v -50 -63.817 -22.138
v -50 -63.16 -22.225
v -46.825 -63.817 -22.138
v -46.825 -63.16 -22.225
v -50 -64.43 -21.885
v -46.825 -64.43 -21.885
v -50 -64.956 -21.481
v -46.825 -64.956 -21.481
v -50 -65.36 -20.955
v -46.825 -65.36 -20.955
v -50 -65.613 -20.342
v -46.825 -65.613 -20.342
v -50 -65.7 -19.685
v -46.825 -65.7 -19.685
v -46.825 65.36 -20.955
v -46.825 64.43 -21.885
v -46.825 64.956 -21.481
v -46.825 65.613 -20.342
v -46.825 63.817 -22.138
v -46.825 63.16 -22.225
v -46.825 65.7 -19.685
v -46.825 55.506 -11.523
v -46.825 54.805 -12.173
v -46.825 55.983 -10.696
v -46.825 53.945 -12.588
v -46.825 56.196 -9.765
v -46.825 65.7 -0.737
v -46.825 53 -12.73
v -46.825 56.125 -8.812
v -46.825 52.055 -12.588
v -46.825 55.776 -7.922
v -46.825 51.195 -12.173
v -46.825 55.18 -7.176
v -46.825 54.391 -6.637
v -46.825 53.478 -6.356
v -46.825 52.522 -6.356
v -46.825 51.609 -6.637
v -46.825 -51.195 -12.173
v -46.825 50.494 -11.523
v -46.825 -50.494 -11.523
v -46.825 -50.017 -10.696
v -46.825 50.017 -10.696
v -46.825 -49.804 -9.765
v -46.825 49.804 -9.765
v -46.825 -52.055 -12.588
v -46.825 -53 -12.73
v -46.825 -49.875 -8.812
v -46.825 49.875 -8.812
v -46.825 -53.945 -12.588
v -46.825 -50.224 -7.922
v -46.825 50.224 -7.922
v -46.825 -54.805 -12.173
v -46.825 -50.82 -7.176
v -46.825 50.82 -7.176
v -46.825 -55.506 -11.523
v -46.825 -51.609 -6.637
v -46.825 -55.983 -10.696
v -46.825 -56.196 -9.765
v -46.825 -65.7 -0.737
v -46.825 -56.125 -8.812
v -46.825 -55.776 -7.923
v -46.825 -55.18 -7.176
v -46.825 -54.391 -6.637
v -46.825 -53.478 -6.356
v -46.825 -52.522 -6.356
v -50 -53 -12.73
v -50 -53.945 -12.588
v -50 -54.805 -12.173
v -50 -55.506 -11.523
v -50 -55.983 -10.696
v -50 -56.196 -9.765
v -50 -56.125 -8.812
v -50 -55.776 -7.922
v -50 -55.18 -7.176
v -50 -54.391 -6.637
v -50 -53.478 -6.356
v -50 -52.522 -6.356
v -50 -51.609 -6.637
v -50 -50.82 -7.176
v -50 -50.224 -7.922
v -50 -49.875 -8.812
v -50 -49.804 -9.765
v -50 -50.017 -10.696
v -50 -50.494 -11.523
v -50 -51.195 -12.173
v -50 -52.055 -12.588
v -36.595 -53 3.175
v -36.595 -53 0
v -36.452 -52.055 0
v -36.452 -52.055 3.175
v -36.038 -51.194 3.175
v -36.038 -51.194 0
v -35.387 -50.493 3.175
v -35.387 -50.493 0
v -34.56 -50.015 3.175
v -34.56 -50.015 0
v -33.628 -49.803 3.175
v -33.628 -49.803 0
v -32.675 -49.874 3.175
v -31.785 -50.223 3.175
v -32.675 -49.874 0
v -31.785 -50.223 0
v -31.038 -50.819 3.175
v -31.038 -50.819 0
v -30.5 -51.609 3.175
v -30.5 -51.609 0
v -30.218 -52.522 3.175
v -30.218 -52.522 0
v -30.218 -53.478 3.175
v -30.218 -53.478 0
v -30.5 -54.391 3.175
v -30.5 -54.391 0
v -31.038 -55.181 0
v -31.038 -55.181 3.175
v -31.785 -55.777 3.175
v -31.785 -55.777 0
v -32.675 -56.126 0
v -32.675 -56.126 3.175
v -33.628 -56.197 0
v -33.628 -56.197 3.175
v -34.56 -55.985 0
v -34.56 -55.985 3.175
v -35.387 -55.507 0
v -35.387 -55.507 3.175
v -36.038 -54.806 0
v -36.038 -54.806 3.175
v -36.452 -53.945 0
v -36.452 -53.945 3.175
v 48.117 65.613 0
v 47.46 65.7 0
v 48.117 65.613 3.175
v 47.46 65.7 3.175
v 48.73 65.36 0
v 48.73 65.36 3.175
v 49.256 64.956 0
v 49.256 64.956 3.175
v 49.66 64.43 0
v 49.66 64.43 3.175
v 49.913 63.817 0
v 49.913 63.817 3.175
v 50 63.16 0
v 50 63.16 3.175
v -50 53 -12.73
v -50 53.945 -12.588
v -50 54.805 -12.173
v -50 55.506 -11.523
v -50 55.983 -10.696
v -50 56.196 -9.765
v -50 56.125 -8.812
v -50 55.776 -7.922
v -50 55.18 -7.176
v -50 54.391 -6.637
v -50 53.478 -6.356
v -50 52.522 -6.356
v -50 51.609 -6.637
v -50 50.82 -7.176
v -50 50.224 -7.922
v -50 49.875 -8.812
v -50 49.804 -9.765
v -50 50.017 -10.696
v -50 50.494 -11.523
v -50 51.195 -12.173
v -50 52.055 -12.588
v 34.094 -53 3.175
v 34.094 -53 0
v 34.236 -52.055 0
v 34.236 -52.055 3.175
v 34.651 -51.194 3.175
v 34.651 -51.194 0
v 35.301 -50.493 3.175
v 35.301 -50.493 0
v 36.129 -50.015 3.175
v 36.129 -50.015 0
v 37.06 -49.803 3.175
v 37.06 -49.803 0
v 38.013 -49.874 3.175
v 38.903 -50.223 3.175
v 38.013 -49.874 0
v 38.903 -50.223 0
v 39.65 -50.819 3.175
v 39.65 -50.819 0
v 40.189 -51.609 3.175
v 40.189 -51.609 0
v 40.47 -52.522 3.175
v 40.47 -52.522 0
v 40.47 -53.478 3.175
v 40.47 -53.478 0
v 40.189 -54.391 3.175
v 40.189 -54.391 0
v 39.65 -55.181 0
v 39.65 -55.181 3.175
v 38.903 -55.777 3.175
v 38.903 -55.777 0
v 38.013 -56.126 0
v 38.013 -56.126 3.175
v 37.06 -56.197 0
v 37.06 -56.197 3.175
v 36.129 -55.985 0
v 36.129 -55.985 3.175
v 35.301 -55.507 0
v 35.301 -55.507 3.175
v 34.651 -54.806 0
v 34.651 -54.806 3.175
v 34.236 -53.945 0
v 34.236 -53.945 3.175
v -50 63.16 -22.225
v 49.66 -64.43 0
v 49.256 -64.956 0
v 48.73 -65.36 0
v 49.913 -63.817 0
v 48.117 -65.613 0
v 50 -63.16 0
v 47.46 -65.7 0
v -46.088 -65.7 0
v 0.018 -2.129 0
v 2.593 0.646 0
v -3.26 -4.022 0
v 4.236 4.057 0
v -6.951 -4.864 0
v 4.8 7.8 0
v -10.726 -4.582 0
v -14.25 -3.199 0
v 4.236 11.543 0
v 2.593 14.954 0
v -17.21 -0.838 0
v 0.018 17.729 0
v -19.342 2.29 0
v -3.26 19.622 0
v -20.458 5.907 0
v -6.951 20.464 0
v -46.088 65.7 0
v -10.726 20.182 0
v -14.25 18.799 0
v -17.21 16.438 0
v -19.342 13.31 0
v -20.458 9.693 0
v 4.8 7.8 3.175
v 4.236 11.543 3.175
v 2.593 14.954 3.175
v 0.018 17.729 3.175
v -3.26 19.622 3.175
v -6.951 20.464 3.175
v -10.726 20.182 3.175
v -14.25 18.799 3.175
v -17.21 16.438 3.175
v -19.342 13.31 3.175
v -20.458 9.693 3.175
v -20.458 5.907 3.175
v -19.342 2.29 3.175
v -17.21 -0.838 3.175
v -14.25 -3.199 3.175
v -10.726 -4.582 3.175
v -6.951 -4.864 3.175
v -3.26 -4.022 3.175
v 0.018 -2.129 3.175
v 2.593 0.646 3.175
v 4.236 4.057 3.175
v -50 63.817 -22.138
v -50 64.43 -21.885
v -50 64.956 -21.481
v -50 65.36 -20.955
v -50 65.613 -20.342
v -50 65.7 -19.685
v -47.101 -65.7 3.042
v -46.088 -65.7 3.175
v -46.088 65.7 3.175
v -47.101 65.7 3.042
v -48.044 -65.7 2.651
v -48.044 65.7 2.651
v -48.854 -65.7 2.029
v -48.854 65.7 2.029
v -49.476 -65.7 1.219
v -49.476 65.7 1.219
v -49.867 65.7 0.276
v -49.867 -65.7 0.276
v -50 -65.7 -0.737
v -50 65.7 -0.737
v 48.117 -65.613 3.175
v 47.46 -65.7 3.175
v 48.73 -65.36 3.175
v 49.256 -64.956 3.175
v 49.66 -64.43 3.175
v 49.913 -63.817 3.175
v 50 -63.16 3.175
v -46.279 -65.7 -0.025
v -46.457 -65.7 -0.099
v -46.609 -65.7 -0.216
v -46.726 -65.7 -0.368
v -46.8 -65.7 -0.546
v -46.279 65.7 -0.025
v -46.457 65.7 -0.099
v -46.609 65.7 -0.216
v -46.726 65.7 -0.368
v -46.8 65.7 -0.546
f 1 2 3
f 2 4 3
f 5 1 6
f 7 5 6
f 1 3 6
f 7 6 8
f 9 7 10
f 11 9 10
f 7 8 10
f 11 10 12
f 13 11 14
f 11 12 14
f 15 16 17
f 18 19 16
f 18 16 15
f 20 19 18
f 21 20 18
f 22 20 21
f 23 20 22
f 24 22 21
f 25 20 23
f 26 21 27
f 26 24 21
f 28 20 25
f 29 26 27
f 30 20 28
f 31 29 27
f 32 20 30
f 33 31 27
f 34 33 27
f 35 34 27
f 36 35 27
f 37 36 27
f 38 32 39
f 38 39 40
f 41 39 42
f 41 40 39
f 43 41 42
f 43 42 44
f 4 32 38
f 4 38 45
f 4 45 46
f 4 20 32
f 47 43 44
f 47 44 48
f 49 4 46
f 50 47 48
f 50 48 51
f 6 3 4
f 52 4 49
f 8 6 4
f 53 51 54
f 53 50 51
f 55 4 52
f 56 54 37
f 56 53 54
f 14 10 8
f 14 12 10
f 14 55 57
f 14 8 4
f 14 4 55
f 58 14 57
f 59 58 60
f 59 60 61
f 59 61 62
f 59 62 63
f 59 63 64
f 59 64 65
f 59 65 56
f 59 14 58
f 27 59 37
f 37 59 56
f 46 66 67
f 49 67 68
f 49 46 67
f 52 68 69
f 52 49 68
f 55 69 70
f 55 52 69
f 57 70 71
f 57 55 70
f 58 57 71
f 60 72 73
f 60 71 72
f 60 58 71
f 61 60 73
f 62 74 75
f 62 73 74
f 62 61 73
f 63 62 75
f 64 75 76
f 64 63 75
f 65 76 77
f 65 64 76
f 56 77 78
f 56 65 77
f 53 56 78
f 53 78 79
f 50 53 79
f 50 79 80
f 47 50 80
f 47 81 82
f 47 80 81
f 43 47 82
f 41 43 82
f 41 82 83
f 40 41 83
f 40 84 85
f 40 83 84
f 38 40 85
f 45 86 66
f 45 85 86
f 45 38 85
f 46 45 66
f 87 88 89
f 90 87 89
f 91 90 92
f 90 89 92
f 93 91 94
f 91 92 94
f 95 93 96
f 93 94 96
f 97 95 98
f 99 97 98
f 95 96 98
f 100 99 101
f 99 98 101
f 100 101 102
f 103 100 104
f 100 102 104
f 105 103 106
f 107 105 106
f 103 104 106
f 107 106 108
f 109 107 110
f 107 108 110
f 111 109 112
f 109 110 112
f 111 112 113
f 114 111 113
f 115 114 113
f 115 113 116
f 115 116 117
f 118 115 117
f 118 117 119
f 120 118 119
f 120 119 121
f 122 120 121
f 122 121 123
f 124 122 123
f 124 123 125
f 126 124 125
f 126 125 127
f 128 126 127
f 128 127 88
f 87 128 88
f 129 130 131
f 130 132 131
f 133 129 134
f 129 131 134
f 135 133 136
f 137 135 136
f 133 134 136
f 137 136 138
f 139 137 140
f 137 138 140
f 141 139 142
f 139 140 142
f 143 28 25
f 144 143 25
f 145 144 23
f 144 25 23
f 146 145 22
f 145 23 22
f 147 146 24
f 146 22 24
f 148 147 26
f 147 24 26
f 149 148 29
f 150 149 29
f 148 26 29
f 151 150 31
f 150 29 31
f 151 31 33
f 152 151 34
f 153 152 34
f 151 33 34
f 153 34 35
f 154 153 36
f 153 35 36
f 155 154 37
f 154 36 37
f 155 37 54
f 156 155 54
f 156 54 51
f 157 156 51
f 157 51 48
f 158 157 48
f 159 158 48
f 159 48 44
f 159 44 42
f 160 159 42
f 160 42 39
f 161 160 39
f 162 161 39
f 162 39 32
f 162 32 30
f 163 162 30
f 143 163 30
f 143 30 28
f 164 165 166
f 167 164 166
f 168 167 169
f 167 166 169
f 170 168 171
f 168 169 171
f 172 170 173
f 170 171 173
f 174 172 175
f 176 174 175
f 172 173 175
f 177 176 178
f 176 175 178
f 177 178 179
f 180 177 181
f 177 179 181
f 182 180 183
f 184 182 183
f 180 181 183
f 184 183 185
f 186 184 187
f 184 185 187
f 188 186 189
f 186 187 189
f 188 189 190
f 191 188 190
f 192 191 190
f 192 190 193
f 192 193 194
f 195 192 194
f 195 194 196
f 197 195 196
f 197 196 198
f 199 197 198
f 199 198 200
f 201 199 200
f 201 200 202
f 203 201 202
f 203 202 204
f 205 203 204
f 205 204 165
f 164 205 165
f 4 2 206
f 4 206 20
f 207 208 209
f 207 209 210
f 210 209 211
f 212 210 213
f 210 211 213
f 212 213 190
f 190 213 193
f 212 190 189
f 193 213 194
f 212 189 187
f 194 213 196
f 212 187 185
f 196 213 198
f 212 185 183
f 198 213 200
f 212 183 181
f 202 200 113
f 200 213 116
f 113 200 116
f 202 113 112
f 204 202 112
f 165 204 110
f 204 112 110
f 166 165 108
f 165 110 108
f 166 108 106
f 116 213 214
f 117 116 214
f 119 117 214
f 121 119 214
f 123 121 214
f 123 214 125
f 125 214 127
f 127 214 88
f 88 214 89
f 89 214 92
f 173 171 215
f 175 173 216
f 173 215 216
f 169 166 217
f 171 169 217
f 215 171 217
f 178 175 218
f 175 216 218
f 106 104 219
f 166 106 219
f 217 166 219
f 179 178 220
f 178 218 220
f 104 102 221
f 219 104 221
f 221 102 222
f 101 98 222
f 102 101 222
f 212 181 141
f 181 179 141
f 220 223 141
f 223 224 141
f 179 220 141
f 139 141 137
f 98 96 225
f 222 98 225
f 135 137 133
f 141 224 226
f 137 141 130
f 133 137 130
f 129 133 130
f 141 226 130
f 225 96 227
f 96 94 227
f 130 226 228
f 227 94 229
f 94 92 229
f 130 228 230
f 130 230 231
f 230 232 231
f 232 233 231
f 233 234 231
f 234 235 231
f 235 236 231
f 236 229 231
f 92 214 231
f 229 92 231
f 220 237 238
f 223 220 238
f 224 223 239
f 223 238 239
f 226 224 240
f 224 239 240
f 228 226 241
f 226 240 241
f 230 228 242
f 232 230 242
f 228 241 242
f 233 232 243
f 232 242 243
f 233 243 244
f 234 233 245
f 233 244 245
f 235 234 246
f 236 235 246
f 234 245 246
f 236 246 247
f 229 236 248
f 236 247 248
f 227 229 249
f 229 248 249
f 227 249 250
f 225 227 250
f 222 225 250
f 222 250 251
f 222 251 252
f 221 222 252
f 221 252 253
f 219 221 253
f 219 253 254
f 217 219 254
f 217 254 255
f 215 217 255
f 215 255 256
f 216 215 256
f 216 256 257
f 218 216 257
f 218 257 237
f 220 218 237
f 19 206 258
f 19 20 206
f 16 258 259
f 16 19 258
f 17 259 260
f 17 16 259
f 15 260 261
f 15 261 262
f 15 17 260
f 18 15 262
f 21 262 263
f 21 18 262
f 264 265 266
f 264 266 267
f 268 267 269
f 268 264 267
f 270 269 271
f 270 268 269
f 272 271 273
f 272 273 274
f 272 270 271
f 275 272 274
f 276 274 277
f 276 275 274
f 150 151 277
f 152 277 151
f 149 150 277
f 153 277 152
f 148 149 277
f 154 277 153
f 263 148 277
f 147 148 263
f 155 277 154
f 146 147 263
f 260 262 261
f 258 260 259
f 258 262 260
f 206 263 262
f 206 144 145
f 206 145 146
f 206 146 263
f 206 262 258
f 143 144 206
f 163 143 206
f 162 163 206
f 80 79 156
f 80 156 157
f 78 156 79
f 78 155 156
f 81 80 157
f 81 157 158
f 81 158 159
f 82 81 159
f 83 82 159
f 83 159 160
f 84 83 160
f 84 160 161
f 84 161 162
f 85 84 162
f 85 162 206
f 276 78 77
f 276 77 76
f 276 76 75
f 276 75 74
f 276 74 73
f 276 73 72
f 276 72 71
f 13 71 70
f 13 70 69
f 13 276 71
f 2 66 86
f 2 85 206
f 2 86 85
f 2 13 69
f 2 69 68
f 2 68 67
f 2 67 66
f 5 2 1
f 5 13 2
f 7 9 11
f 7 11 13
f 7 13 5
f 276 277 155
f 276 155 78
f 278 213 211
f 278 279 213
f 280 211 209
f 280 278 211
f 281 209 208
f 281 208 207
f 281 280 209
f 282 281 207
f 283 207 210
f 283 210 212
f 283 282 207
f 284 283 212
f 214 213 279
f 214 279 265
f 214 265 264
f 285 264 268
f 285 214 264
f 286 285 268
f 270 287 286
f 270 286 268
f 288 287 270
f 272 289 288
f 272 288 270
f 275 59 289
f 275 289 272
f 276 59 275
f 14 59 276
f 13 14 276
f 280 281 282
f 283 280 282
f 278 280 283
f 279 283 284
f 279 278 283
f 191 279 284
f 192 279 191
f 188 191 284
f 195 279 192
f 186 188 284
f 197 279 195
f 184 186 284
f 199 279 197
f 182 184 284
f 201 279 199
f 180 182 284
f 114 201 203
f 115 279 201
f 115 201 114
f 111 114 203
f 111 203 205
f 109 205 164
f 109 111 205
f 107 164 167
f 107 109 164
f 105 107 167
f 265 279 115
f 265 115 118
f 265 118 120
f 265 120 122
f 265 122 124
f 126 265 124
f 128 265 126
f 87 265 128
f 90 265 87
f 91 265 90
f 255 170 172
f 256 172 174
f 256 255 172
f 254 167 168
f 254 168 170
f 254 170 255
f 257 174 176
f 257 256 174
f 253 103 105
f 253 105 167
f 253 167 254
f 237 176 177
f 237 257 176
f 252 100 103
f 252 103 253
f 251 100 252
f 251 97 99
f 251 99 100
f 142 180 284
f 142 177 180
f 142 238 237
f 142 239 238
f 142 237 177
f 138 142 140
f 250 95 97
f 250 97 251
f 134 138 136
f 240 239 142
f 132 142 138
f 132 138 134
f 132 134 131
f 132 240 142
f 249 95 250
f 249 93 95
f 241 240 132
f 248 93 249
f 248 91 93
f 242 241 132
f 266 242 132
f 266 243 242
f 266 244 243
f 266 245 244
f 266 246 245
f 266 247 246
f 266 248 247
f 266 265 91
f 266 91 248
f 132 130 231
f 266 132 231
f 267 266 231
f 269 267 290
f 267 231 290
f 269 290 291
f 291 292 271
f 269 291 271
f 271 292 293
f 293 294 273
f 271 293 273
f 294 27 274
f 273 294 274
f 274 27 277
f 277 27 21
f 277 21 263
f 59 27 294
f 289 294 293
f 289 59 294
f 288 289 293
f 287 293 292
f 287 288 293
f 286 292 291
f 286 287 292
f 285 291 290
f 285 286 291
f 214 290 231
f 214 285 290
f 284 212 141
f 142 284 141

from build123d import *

# Parameters (mm, degrees)
SKETCH1_W                    = 131.4
SKETCH1_H                    = 100
BASE_FLANGE1_DEPTH           = 3.175
EDGE_FLANGE1_STRIP_W         = 14.1732
EDGE_FLANGE1_STRIP_H         = 3.175
EDGE_FLANGE1_STRIP_CUT_DEPTH = 131.4
EDGE_FLANGE1_DEPTH           = 131.4
FILLET1_R                    = 2.54
SKETCH15_R                   = 12.7
MOTOR_HOLE_DEPTH             = 87.380842784
SKETCH9_R                    = 3.205
CUT_EXTRUDE1_DEPTH           = 120.102985899
SKETCH10_R                   = 3.206253706
CUT_EXTRUDE2_DEPTH           = 86.501114759


# Sheet-metal steps are written as plain solids
with BuildPart() as part:
    # Sketch1 → Base-Flange1 (new body)
    with BuildSketch(Plane(origin=(0, 0, 0), x_dir=(0, 1, 0), z_dir=(0, 0, 1))):
        Rectangle(SKETCH1_W, SKETCH1_H)
    extrude(amount=BASE_FLANGE1_DEPTH)

    # Edge-Flange1 strip (across the edge) → Edge-Flange1 strip cut (cut)
    with BuildSketch(Plane(origin=(-50, -65.7, 0), x_dir=(1, 0, 0), z_dir=(0, 1, 0))):
        with Locations((-3.175, -1.5875)):
            Rectangle(EDGE_FLANGE1_STRIP_W, EDGE_FLANGE1_STRIP_H)
    extrude(amount=EDGE_FLANGE1_STRIP_CUT_DEPTH, mode=Mode.SUBTRACT)

    # Edge-Flange1 section (across the edge) → Edge-Flange1 (add)
    with BuildSketch(Plane(origin=(-50, -65.7, 0), x_dir=(1, 0, 0), z_dir=(0, 1, 0))):
        with BuildLine():
            Line((0, 0.7366), (0, 22.225))
            Line((0, 22.225), (3.175, 22.225))
            Line((3.175, 22.225), (3.175, 0.7366))
            ThreePointArc((3.175, 0.7366), (3.390745145, 0.215745145), (3.9116, 0))
            Line((3.9116, 0), (3.9116, -3.175))
            ThreePointArc((3.9116, -3.175), (1.145681115, -2.029318885), (0, 0.7366))
        make_face()
    extrude(amount=EDGE_FLANGE1_DEPTH)

    # Fillet1
    fillet1_edges = [part.edges().sort_by_distance(p)[0] for p in [
        (-48.4125, -65.7, -22.225),
        (-48.4125, 65.7, -22.225),
        (50, 65.7, 1.5875),
        (50, -65.7, 1.5875),
    ]]
    fillet(fillet1_edges, radius=FILLET1_R)

    # Sketch15 → Motor Hole (cut, through all)
    with BuildSketch(Plane.XY.offset(3.175)):
        with Locations((-7.9, 7.8)):
            Circle(SKETCH15_R)
    extrude(amount=-MOTOR_HOLE_DEPTH, mode=Mode.SUBTRACT)

    # Sketch9 → Cut-Extrude1 (cut, through all)
    with BuildSketch(Plane.YZ.offset(-46.825)):
        with Locations(Location((53, -9.525, 0), (0, 0, 270))):
            Circle(SKETCH9_R)
    cut_extrude1 = extrude(amount=-CUT_EXTRUDE1_DEPTH, mode=Mode.SUBTRACT)

    # Mirror1: Cut-Extrude1 across plane
    add(cut_extrude1.mirror(Plane.ZX), mode=Mode.SUBTRACT)

    # Sketch10 → Cut-Extrude2 (cut, through all)
    with BuildSketch(Plane(origin=(0, 0, 0), x_dir=(1, 0, 0), z_dir=(0, 0, -1))):
        with Locations(Location((-33.3884, 53, 0), (0, 0, 180))):
            Circle(SKETCH10_R)
        with Locations(Location((37.3, 53, 0), (0, 0, 180))):
            Circle(SKETCH10_R)
    extrude(amount=-CUT_EXTRUDE2_DEPTH, mode=Mode.SUBTRACT)


solid = part.part
